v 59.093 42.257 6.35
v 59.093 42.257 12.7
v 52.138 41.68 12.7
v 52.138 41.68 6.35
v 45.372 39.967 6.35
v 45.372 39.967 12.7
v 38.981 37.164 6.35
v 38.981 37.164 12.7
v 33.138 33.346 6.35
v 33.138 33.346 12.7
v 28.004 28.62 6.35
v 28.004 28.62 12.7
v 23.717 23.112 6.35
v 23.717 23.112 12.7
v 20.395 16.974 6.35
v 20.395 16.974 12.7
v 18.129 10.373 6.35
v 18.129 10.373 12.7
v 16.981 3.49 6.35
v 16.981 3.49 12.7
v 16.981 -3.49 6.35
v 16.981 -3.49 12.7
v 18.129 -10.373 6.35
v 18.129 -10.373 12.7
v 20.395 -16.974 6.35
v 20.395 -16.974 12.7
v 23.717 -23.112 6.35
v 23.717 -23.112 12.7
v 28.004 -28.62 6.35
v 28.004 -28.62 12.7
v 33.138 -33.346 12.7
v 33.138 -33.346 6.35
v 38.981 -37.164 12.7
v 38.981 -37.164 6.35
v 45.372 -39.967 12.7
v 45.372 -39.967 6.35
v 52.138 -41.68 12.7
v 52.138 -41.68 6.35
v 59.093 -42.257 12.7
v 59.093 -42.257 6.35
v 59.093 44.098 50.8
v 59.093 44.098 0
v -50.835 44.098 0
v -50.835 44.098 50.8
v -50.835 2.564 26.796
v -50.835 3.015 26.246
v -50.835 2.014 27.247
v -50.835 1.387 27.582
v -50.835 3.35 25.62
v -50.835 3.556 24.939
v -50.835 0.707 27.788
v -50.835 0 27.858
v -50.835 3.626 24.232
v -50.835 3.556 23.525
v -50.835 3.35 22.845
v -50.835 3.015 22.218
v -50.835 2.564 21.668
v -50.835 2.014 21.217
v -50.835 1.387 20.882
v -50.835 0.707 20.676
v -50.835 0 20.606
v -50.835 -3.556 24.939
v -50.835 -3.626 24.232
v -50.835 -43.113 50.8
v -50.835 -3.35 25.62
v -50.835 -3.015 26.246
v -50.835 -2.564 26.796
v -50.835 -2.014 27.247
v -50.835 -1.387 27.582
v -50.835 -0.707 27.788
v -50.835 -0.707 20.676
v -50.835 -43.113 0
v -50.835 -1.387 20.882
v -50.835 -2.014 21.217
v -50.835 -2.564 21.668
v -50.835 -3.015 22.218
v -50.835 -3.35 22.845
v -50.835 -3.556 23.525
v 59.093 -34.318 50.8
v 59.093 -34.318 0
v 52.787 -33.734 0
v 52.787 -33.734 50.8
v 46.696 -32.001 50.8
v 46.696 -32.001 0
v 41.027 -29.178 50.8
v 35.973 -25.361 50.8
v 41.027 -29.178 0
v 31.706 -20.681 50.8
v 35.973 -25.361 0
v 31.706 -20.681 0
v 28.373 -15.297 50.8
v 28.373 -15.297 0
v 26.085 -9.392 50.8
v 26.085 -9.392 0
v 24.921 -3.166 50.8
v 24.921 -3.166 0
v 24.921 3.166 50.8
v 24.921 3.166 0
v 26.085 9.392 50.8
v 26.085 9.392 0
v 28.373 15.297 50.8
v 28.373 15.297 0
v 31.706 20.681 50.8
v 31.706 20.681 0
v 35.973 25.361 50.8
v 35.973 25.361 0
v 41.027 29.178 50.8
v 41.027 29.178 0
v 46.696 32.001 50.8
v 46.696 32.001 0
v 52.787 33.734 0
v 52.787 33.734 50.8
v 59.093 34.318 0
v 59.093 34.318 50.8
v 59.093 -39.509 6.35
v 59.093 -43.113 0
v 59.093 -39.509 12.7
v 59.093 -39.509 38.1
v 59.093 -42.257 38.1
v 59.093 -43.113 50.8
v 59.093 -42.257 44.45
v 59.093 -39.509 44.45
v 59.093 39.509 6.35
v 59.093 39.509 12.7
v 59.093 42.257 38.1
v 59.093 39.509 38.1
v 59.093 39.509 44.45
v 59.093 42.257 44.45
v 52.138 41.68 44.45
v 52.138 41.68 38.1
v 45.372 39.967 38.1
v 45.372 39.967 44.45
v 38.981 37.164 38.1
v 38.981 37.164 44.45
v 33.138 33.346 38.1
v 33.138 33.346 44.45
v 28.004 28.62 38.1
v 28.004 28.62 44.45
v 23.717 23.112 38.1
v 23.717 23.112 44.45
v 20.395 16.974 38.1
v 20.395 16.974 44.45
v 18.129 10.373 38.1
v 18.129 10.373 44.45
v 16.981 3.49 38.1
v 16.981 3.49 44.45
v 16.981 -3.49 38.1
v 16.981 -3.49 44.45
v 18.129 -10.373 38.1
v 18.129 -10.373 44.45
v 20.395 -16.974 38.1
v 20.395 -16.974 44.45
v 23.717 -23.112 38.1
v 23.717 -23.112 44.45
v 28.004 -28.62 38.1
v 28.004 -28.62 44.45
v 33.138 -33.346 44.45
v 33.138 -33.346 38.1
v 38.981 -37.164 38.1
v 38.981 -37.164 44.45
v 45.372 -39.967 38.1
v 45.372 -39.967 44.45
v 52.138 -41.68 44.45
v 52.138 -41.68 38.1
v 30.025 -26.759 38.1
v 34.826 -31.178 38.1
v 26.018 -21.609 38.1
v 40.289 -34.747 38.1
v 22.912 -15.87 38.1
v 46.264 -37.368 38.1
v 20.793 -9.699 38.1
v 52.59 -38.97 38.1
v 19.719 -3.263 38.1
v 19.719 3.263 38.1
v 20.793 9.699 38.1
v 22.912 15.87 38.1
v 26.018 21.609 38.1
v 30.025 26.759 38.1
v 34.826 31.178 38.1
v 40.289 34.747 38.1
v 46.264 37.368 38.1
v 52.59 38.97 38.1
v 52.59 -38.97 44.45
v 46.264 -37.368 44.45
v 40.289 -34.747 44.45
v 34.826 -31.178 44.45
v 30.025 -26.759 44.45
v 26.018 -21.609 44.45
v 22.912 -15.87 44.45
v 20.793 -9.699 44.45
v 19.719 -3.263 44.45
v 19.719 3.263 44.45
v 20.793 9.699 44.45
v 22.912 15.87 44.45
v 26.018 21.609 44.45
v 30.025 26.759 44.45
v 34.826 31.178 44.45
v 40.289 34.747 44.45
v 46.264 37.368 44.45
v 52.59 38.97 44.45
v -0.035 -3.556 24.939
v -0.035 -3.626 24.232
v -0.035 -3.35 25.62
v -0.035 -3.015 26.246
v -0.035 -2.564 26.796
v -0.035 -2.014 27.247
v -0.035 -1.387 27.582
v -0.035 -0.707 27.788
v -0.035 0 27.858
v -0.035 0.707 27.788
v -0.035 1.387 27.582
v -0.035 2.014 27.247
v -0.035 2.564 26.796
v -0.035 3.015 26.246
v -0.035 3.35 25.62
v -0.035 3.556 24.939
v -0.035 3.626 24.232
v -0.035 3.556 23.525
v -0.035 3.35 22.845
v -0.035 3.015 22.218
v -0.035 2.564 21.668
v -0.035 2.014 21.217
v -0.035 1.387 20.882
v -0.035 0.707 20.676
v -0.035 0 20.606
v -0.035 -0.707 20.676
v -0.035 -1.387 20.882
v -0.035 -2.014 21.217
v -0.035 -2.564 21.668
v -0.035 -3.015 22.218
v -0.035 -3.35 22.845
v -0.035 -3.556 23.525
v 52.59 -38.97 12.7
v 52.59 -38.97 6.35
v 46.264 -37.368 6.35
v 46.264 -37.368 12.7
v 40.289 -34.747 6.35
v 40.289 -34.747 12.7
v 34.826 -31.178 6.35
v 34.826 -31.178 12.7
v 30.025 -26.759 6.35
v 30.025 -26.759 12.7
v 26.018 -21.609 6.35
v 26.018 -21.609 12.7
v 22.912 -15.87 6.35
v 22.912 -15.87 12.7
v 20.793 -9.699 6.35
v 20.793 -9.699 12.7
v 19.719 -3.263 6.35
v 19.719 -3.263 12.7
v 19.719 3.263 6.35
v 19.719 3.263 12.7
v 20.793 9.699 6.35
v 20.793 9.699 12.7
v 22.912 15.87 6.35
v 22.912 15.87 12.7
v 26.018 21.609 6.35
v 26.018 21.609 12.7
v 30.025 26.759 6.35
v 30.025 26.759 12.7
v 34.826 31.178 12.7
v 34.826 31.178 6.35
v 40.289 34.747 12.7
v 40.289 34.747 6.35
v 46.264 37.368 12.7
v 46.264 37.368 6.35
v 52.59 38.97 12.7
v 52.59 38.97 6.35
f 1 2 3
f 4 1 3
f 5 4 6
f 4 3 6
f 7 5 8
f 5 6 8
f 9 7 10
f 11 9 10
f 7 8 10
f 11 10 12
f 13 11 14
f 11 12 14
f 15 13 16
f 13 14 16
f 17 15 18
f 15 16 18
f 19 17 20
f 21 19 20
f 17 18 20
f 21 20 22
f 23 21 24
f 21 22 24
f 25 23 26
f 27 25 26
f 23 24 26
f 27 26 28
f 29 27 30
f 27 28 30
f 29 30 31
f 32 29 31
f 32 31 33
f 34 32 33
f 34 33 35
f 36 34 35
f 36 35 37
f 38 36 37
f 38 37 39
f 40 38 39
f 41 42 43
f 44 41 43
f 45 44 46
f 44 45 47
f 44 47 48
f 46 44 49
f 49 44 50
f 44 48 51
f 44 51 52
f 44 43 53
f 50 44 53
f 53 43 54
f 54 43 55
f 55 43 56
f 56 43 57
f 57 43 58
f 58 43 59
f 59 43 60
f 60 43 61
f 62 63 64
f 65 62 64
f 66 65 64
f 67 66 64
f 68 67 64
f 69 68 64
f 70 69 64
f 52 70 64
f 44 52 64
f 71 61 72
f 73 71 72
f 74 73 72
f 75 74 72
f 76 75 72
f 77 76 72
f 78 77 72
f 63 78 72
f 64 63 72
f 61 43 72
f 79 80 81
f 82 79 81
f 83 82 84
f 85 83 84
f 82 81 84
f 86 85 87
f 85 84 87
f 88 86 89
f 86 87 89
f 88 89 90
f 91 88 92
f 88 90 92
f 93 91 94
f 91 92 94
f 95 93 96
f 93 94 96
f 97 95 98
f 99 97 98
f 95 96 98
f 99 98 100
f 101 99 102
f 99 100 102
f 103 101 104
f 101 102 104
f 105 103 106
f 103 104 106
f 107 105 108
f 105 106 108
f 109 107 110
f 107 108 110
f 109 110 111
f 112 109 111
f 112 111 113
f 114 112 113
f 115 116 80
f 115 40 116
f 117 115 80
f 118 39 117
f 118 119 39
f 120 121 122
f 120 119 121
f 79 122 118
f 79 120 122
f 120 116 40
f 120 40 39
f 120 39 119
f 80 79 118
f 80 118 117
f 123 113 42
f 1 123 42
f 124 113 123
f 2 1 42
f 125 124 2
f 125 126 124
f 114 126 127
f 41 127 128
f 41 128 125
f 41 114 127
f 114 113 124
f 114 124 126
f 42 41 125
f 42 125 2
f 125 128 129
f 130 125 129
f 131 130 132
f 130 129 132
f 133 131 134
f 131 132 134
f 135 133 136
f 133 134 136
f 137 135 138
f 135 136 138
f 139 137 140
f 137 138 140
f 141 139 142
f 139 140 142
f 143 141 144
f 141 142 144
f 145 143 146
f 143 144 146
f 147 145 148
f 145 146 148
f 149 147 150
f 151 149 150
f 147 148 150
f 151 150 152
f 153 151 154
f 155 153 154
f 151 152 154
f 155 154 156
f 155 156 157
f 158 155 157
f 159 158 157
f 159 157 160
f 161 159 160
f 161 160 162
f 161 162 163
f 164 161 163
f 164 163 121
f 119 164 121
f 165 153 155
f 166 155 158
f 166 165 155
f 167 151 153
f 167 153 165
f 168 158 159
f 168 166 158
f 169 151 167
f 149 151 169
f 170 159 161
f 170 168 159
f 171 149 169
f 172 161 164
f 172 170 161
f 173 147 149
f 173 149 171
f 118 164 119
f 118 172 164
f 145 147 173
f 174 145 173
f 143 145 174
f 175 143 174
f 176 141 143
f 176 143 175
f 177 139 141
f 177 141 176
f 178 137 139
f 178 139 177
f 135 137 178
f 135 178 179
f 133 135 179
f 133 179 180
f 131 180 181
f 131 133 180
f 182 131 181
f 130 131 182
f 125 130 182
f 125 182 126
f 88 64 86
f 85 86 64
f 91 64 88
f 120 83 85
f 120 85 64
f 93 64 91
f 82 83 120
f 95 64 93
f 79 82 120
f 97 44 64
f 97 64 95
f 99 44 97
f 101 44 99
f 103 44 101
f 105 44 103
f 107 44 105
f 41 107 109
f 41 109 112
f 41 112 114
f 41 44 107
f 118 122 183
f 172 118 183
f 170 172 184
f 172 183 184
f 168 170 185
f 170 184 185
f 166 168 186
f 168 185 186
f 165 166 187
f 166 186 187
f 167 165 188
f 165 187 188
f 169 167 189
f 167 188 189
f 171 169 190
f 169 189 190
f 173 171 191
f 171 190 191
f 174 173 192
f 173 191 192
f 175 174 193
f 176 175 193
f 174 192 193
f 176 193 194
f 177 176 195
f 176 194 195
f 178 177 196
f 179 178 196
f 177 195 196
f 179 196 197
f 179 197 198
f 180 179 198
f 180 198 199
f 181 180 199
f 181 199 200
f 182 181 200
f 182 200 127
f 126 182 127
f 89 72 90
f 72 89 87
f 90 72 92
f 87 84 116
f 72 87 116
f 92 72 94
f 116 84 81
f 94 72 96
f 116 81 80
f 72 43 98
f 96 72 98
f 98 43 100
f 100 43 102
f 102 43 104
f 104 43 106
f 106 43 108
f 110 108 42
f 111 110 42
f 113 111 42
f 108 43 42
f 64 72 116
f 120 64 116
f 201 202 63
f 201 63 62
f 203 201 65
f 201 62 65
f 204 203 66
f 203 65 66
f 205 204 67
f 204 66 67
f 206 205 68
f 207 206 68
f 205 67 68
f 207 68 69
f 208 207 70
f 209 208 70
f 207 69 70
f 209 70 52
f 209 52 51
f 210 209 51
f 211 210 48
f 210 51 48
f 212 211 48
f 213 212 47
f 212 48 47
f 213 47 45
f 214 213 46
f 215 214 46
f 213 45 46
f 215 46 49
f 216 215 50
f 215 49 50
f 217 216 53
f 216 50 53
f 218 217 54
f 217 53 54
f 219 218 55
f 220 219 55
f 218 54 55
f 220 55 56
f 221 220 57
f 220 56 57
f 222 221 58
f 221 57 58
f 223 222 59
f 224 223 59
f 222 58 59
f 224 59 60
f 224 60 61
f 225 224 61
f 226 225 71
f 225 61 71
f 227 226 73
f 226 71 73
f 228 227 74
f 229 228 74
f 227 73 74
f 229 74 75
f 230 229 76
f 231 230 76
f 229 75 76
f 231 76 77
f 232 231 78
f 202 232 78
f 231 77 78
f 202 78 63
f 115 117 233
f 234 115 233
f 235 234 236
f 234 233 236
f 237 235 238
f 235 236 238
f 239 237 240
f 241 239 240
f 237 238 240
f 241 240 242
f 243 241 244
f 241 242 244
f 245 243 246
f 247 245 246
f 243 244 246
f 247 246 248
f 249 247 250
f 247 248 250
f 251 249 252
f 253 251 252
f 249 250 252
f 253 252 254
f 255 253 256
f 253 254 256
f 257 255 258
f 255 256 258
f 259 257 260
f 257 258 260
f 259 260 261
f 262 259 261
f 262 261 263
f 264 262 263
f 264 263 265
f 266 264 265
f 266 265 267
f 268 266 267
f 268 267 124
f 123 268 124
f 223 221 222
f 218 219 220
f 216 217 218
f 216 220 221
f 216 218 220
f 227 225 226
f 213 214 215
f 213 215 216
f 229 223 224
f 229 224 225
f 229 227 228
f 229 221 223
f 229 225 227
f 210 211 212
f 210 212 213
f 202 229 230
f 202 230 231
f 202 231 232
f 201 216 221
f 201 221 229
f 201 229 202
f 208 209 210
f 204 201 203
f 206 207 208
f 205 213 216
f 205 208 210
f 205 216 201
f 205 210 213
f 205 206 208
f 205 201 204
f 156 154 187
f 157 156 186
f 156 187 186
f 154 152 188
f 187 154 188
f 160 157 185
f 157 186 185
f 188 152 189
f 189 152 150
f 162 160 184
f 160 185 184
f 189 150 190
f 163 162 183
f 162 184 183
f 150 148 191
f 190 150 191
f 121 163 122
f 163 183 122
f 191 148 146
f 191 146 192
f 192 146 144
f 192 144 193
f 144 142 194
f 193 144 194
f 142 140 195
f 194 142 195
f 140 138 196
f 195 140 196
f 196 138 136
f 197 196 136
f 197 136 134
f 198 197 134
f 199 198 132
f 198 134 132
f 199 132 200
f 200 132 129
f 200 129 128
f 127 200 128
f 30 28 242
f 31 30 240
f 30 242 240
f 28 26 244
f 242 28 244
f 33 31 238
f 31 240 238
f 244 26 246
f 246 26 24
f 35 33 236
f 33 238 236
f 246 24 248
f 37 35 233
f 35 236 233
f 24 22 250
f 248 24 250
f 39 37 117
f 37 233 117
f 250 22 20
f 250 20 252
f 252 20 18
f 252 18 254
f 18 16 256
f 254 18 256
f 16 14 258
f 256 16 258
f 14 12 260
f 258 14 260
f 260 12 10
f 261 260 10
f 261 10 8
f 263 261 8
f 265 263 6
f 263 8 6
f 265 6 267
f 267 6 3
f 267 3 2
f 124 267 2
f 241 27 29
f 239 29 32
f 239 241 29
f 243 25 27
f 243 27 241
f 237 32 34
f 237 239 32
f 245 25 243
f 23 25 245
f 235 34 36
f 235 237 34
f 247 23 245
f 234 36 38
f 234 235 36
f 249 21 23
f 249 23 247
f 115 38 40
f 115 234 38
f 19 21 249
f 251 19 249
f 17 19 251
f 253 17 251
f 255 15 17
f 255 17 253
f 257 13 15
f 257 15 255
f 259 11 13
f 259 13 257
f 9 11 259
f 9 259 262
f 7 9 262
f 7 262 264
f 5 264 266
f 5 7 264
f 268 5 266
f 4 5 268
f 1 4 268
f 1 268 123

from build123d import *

# Parameters (mm, degrees)
F1_DEPTH = 50.8
F2_R     = 3.625658
F3_DEPTH = 50.8
F5_DEPTH = 44.45
F6_DEPTH = 38.1
F7_DEPTH = 12.7
F8_DEPTH = 6.35


with BuildPart() as f1:
    # F0 (on Top) → F1 (new body)
    with BuildSketch(Plane.XY):
        with BuildLine():
            Line((59.092954, 44.097524), (-50.835285, 44.097524))
            Line((-50.835285, 44.097524), (-50.835285, -43.112647))
            Line((-50.835285, -43.112647), (59.092954, -43.112647))
            Line((59.092954, -43.112647), (59.092954, -34.318248))
            ThreePointArc((59.092954, -34.318248), (24.774705, 0), (59.092954, 34.318248))
            Line((59.092954, 34.318248), (59.092954, 44.097524))
        make_face()
    extrude(amount=F1_DEPTH)

    # F2 (on face) → F3 (cut)
    with BuildSketch(Plane(origin=(-50.835285, 0, 0), x_dir=(0, -1, 0), z_dir=(-1, 0, 0))):
        with Locations((0, 24.232104)):
            Circle(F2_R)
    extrude(amount=-F3_DEPTH, mode=Mode.SUBTRACT)

    # F4 (on face) → F5 (cut)
    with BuildSketch(Plane.XY.offset(50.8)):
        with BuildLine():
            ThreePointArc((59.092954, -39.50878), (19.584174, 0), (59.092954, 39.50878))
            Line((59.092954, 39.50878), (59.092954, 42.25664))
            ThreePointArc((59.092954, 42.25664), (16.836314, 0), (59.092954, -42.25664))
            Line((59.092954, -42.25664), (59.092954, -39.50878))
        make_face()
    extrude(amount=-F5_DEPTH, mode=Mode.SUBTRACT)

    # F4 (on face) → F6 (join)
    with BuildSketch(Plane.XY.offset(50.8)):
        with BuildLine():
            ThreePointArc((59.092954, -39.50878), (19.584174, 0), (59.092954, 39.50878))
            Line((59.092954, 39.50878), (59.092954, 42.25664))
            ThreePointArc((59.092954, 42.25664), (16.836314, 0), (59.092954, -42.25664))
            Line((59.092954, -42.25664), (59.092954, -39.50878))
        make_face()
    extrude(amount=-F6_DEPTH)

    # F4 (on face) → F7 (cut)
    with BuildSketch(Plane.XY.offset(50.8)):
        with BuildLine():
            ThreePointArc((59.092954, -39.50878), (19.584174, 0), (59.092954, 39.50878))
            Line((59.092954, 39.50878), (59.092954, 42.25664))
            ThreePointArc((59.092954, 42.25664), (16.836314, 0), (59.092954, -42.25664))
            Line((59.092954, -42.25664), (59.092954, -39.50878))
        make_face()
    extrude(amount=-F7_DEPTH, mode=Mode.SUBTRACT)

    # F4 (on face) → F8 (join)
    with BuildSketch(Plane.XY.offset(50.8)):
        with BuildLine():
            ThreePointArc((59.092954, -39.50878), (19.584174, 0), (59.092954, 39.50878))
            Line((59.092954, 39.50878), (59.092954, 42.25664))
            ThreePointArc((59.092954, 42.25664), (16.836314, 0), (59.092954, -42.25664))
            Line((59.092954, -42.25664), (59.092954, -39.50878))
        make_face()
    extrude(amount=-F8_DEPTH)


solid = f1.part
